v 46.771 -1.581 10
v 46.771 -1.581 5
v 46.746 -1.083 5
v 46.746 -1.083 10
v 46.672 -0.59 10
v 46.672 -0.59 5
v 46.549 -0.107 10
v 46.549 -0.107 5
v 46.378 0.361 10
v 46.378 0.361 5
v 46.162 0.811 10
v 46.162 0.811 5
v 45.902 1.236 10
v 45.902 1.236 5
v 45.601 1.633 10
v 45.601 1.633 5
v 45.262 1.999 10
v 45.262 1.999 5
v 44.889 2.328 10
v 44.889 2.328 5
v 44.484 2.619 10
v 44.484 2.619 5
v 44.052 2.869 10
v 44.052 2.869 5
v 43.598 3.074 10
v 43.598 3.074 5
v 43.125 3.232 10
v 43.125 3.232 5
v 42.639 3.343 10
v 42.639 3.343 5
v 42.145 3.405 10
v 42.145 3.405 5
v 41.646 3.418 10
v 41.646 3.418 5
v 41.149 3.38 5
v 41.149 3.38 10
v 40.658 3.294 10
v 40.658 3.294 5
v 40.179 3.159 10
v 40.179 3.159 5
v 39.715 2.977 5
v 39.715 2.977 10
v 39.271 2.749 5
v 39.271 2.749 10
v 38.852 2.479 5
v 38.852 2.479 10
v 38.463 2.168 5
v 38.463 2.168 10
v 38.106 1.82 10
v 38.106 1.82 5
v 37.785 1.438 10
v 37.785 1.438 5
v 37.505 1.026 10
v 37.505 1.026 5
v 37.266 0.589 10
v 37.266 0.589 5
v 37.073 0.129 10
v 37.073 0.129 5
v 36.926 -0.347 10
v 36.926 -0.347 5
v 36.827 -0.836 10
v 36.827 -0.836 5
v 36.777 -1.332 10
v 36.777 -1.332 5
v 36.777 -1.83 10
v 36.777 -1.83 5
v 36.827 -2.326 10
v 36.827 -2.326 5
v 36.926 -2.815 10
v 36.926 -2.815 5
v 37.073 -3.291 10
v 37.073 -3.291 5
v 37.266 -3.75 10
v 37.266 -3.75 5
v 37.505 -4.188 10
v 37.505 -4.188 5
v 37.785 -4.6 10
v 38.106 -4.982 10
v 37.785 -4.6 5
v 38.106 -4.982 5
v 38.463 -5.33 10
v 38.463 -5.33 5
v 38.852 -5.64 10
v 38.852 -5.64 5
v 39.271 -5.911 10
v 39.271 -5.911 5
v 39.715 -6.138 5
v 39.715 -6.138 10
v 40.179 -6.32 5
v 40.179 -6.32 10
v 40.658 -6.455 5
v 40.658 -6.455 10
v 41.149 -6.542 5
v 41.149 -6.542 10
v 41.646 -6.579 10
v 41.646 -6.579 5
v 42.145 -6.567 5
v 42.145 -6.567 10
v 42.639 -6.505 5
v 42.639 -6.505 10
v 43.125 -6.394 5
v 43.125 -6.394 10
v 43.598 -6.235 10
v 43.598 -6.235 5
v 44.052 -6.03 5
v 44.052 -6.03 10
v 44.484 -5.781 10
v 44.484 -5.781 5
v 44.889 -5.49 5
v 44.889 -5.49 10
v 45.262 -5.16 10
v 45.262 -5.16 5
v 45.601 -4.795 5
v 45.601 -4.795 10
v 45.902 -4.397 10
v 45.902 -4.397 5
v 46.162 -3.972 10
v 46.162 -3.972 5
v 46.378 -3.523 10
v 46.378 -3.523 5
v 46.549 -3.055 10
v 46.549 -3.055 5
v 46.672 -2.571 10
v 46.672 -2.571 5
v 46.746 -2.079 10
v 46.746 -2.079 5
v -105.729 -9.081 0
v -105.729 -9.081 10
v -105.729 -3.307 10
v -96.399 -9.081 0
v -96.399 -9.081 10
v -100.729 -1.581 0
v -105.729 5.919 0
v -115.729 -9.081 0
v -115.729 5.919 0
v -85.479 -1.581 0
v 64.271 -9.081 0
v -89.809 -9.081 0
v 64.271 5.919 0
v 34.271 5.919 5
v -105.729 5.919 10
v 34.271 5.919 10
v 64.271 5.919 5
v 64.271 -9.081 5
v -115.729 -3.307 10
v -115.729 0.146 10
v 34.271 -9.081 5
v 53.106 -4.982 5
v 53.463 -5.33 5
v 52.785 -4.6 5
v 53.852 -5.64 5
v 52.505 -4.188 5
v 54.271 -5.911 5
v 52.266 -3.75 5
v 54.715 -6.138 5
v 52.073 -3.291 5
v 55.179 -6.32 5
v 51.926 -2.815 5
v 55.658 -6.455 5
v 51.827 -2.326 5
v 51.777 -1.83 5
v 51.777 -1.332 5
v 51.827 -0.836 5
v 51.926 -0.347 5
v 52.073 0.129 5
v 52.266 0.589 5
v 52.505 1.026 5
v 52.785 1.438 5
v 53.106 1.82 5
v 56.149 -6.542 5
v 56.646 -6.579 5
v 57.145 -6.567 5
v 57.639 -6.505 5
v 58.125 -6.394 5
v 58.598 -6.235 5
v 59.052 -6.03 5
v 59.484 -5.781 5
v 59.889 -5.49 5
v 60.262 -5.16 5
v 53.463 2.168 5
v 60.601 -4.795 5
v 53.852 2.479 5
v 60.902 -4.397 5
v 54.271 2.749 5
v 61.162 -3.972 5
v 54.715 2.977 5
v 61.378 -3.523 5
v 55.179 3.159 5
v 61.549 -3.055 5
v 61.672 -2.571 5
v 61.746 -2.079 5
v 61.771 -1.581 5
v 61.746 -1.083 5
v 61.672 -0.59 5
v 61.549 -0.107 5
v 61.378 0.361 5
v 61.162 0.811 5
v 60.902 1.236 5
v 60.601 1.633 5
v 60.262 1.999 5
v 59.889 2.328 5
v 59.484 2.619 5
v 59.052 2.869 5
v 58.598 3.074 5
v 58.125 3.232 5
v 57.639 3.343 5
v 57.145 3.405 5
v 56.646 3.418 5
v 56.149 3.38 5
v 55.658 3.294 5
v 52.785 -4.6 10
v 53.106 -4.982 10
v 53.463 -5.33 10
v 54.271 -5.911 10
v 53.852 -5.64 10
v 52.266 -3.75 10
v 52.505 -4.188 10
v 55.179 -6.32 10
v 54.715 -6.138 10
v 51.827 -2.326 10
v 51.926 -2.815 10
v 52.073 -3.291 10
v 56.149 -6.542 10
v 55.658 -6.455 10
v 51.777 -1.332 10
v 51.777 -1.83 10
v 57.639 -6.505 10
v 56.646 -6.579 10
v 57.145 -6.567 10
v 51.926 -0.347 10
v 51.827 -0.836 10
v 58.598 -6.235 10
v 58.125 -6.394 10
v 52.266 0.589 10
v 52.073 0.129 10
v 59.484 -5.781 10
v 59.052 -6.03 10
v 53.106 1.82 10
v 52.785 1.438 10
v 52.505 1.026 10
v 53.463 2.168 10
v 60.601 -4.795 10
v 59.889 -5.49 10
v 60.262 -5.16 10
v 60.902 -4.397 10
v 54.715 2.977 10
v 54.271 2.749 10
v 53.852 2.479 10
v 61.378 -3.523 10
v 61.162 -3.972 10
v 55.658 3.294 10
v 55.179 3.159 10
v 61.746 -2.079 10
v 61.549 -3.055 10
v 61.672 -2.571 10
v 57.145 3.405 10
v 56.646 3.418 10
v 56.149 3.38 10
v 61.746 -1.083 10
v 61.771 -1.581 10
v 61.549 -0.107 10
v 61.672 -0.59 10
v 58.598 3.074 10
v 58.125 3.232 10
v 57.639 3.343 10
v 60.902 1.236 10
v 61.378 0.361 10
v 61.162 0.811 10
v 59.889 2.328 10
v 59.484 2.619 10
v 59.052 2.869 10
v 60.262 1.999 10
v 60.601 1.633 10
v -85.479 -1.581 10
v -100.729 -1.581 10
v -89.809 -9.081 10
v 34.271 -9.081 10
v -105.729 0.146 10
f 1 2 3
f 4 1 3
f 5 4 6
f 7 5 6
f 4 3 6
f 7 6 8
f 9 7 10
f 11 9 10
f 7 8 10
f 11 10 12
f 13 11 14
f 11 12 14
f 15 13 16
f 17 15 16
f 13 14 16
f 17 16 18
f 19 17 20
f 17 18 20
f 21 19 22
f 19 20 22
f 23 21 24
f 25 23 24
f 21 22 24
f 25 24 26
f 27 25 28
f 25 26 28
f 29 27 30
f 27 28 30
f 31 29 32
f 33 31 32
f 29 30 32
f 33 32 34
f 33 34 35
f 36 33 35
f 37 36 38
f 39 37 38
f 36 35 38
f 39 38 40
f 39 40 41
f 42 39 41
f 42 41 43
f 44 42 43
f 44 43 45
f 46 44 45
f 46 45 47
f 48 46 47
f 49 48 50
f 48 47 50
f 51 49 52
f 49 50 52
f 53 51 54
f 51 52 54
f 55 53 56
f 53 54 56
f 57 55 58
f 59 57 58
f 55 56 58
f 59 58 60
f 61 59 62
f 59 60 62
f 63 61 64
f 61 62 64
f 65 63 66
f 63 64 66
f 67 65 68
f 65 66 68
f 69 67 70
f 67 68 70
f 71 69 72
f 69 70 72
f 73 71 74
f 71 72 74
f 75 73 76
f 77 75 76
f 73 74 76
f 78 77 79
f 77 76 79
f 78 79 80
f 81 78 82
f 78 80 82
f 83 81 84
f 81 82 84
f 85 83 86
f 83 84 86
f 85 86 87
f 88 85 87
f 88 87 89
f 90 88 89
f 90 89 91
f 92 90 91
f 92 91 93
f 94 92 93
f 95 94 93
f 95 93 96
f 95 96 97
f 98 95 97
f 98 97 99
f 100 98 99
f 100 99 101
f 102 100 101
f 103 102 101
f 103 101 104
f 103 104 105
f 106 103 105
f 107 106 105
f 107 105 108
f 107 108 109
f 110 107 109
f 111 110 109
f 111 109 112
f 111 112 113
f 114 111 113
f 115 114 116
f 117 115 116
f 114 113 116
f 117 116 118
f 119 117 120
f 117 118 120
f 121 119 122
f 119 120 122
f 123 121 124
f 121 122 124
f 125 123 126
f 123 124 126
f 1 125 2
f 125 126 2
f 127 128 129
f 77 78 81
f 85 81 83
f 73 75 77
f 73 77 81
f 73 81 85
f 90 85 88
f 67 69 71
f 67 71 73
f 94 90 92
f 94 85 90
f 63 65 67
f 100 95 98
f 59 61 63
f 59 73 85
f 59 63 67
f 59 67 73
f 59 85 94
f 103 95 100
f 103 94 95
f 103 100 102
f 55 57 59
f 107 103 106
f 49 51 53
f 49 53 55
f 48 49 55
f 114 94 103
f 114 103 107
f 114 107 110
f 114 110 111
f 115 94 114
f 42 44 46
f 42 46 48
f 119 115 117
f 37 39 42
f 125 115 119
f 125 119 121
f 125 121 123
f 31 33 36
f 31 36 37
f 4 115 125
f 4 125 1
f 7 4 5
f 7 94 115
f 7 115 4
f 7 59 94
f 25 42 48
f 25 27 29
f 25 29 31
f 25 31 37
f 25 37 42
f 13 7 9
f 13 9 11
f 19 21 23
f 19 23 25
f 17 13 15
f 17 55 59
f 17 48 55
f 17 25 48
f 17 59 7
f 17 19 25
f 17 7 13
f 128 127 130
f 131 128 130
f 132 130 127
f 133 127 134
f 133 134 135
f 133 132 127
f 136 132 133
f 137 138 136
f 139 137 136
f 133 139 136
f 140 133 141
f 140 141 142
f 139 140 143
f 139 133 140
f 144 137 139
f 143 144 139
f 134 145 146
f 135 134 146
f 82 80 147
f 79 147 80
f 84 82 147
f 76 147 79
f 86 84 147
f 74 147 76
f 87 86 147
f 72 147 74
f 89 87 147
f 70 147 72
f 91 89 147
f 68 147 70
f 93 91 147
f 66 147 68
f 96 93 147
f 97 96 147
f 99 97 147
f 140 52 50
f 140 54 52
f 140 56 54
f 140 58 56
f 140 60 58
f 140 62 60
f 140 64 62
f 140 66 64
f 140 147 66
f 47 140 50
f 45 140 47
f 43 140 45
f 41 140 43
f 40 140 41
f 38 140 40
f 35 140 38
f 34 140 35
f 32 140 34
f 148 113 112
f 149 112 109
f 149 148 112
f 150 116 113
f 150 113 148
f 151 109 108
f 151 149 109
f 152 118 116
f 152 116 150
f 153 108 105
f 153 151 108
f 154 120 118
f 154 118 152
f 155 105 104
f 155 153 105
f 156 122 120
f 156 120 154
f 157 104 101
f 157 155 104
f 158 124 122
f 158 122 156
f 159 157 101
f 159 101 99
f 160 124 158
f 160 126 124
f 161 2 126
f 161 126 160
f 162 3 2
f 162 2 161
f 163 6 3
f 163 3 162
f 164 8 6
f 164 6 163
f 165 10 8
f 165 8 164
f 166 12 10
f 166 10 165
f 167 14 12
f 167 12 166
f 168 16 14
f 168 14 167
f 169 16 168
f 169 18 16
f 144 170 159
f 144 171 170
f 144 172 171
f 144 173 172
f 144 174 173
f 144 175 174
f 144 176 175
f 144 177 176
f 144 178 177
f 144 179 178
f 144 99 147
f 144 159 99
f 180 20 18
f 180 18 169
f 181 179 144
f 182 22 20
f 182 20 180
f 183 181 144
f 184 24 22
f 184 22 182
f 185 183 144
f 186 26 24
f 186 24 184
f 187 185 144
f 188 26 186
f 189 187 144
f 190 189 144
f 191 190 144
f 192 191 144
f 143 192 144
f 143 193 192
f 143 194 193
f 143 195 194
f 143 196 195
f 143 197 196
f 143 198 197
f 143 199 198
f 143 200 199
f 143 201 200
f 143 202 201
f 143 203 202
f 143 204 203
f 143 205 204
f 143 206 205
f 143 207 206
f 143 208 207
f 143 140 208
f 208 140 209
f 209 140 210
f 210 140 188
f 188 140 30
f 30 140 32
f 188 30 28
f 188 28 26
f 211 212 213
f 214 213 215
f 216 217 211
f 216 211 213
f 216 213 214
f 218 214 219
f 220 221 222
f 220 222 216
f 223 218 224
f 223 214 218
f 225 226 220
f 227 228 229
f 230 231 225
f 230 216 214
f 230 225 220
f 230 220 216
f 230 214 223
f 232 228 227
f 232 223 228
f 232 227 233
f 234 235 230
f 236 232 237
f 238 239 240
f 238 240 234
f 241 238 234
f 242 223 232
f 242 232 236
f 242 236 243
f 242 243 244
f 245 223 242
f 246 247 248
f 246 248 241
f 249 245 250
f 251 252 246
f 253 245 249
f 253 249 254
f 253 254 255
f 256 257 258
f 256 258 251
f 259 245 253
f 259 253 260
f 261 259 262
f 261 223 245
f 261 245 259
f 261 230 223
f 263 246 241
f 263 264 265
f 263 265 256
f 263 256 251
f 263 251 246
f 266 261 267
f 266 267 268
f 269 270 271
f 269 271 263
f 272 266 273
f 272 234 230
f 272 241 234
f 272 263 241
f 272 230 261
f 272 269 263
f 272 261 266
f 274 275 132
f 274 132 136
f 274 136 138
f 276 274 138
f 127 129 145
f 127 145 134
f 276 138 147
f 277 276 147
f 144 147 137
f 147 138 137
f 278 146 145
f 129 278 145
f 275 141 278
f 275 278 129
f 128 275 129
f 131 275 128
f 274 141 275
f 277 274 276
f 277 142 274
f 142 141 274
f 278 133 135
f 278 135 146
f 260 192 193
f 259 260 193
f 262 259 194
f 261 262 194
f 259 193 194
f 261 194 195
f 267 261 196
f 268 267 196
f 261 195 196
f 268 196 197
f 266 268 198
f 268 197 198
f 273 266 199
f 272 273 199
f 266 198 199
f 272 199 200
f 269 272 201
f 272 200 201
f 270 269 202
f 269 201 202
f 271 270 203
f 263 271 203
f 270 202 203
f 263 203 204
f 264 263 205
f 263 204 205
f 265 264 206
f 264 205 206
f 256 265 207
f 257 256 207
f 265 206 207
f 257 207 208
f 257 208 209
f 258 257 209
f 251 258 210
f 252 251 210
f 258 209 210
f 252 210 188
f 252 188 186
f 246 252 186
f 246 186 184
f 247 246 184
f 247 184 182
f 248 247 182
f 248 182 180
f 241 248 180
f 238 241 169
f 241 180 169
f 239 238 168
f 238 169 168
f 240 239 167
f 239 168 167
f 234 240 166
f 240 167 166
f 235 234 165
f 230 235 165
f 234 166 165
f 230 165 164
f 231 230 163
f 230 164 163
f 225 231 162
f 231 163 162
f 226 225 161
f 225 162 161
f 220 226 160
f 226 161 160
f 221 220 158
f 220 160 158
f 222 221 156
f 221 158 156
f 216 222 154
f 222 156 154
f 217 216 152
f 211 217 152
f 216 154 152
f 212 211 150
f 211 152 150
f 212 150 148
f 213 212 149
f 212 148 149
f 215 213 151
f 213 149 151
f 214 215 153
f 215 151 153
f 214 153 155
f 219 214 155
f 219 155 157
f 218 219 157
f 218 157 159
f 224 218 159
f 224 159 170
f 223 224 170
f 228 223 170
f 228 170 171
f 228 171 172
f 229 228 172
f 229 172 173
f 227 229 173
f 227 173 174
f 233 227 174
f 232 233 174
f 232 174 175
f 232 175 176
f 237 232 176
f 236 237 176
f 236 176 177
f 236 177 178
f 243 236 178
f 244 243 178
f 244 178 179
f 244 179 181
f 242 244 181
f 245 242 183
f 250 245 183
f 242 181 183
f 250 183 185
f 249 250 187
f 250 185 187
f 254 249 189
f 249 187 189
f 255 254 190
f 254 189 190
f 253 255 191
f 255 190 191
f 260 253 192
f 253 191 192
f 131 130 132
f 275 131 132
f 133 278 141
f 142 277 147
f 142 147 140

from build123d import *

# Parameters (mm, degrees)
SKETCH_W        = 170
SKETCH_H        = 15
PAD_DEPTH       = 10
SKETCH001_W     = 35
SKETCH001_H     = 25
POCKET_DEPTH    = 5
SKETCH002_R     = 5
PAD001_DEPTH    = 5
PAD002_DEPTH    = 10
POCKET001_DEPTH = 10


with BuildPart() as part:
    # Sketch → Pad (new body)
    with BuildSketch(Plane.XY):
        with Locations((-20.728933, -1.58076)):
            Rectangle(SKETCH_W, SKETCH_H)
    extrude(amount=PAD_DEPTH)

    # Sketch001 (on Face6 of Pad) → Pocket (cut)
    with BuildSketch(Plane.XY.offset(10)):
        with Locations((51.771067, -1.58076)):
            Rectangle(SKETCH001_W, SKETCH001_H)
    extrude(amount=-POCKET_DEPTH, mode=Mode.SUBTRACT)

    # Sketch002 (on Face7 of Pocket) → Pad001 (join)
    with BuildSketch(Plane.XY.offset(5)):
        with Locations((56.771067, -1.58076)):
            Circle(SKETCH002_R)
        with Locations((41.771067, -1.58076)):
            Circle(SKETCH002_R)
    extrude(amount=PAD001_DEPTH)

    # Sketch003 (on Face1 of Pad001) → Pad002 (join)
    with BuildSketch(Plane(origin=(-105.728933, 0, 0), x_dir=(0, -1, 0), z_dir=(-1, 0, 0))):
        Polygon((-5.91924, 0), (-0.145737, 10), (3.307257, 10), (9.08076, 0), align=None)
    extrude(amount=PAD002_DEPTH)

    # Sketch004 (on Face3 of Pad002) → Pocket001 (cut)
    with BuildSketch(Plane.XY.offset(10)):
        Polygon((-93.103933, -14.787648), (-100.728933, -1.58076), (-85.478933, -1.58076), align=None)
    extrude(amount=-POCKET001_DEPTH, mode=Mode.SUBTRACT)


solid = part.part
